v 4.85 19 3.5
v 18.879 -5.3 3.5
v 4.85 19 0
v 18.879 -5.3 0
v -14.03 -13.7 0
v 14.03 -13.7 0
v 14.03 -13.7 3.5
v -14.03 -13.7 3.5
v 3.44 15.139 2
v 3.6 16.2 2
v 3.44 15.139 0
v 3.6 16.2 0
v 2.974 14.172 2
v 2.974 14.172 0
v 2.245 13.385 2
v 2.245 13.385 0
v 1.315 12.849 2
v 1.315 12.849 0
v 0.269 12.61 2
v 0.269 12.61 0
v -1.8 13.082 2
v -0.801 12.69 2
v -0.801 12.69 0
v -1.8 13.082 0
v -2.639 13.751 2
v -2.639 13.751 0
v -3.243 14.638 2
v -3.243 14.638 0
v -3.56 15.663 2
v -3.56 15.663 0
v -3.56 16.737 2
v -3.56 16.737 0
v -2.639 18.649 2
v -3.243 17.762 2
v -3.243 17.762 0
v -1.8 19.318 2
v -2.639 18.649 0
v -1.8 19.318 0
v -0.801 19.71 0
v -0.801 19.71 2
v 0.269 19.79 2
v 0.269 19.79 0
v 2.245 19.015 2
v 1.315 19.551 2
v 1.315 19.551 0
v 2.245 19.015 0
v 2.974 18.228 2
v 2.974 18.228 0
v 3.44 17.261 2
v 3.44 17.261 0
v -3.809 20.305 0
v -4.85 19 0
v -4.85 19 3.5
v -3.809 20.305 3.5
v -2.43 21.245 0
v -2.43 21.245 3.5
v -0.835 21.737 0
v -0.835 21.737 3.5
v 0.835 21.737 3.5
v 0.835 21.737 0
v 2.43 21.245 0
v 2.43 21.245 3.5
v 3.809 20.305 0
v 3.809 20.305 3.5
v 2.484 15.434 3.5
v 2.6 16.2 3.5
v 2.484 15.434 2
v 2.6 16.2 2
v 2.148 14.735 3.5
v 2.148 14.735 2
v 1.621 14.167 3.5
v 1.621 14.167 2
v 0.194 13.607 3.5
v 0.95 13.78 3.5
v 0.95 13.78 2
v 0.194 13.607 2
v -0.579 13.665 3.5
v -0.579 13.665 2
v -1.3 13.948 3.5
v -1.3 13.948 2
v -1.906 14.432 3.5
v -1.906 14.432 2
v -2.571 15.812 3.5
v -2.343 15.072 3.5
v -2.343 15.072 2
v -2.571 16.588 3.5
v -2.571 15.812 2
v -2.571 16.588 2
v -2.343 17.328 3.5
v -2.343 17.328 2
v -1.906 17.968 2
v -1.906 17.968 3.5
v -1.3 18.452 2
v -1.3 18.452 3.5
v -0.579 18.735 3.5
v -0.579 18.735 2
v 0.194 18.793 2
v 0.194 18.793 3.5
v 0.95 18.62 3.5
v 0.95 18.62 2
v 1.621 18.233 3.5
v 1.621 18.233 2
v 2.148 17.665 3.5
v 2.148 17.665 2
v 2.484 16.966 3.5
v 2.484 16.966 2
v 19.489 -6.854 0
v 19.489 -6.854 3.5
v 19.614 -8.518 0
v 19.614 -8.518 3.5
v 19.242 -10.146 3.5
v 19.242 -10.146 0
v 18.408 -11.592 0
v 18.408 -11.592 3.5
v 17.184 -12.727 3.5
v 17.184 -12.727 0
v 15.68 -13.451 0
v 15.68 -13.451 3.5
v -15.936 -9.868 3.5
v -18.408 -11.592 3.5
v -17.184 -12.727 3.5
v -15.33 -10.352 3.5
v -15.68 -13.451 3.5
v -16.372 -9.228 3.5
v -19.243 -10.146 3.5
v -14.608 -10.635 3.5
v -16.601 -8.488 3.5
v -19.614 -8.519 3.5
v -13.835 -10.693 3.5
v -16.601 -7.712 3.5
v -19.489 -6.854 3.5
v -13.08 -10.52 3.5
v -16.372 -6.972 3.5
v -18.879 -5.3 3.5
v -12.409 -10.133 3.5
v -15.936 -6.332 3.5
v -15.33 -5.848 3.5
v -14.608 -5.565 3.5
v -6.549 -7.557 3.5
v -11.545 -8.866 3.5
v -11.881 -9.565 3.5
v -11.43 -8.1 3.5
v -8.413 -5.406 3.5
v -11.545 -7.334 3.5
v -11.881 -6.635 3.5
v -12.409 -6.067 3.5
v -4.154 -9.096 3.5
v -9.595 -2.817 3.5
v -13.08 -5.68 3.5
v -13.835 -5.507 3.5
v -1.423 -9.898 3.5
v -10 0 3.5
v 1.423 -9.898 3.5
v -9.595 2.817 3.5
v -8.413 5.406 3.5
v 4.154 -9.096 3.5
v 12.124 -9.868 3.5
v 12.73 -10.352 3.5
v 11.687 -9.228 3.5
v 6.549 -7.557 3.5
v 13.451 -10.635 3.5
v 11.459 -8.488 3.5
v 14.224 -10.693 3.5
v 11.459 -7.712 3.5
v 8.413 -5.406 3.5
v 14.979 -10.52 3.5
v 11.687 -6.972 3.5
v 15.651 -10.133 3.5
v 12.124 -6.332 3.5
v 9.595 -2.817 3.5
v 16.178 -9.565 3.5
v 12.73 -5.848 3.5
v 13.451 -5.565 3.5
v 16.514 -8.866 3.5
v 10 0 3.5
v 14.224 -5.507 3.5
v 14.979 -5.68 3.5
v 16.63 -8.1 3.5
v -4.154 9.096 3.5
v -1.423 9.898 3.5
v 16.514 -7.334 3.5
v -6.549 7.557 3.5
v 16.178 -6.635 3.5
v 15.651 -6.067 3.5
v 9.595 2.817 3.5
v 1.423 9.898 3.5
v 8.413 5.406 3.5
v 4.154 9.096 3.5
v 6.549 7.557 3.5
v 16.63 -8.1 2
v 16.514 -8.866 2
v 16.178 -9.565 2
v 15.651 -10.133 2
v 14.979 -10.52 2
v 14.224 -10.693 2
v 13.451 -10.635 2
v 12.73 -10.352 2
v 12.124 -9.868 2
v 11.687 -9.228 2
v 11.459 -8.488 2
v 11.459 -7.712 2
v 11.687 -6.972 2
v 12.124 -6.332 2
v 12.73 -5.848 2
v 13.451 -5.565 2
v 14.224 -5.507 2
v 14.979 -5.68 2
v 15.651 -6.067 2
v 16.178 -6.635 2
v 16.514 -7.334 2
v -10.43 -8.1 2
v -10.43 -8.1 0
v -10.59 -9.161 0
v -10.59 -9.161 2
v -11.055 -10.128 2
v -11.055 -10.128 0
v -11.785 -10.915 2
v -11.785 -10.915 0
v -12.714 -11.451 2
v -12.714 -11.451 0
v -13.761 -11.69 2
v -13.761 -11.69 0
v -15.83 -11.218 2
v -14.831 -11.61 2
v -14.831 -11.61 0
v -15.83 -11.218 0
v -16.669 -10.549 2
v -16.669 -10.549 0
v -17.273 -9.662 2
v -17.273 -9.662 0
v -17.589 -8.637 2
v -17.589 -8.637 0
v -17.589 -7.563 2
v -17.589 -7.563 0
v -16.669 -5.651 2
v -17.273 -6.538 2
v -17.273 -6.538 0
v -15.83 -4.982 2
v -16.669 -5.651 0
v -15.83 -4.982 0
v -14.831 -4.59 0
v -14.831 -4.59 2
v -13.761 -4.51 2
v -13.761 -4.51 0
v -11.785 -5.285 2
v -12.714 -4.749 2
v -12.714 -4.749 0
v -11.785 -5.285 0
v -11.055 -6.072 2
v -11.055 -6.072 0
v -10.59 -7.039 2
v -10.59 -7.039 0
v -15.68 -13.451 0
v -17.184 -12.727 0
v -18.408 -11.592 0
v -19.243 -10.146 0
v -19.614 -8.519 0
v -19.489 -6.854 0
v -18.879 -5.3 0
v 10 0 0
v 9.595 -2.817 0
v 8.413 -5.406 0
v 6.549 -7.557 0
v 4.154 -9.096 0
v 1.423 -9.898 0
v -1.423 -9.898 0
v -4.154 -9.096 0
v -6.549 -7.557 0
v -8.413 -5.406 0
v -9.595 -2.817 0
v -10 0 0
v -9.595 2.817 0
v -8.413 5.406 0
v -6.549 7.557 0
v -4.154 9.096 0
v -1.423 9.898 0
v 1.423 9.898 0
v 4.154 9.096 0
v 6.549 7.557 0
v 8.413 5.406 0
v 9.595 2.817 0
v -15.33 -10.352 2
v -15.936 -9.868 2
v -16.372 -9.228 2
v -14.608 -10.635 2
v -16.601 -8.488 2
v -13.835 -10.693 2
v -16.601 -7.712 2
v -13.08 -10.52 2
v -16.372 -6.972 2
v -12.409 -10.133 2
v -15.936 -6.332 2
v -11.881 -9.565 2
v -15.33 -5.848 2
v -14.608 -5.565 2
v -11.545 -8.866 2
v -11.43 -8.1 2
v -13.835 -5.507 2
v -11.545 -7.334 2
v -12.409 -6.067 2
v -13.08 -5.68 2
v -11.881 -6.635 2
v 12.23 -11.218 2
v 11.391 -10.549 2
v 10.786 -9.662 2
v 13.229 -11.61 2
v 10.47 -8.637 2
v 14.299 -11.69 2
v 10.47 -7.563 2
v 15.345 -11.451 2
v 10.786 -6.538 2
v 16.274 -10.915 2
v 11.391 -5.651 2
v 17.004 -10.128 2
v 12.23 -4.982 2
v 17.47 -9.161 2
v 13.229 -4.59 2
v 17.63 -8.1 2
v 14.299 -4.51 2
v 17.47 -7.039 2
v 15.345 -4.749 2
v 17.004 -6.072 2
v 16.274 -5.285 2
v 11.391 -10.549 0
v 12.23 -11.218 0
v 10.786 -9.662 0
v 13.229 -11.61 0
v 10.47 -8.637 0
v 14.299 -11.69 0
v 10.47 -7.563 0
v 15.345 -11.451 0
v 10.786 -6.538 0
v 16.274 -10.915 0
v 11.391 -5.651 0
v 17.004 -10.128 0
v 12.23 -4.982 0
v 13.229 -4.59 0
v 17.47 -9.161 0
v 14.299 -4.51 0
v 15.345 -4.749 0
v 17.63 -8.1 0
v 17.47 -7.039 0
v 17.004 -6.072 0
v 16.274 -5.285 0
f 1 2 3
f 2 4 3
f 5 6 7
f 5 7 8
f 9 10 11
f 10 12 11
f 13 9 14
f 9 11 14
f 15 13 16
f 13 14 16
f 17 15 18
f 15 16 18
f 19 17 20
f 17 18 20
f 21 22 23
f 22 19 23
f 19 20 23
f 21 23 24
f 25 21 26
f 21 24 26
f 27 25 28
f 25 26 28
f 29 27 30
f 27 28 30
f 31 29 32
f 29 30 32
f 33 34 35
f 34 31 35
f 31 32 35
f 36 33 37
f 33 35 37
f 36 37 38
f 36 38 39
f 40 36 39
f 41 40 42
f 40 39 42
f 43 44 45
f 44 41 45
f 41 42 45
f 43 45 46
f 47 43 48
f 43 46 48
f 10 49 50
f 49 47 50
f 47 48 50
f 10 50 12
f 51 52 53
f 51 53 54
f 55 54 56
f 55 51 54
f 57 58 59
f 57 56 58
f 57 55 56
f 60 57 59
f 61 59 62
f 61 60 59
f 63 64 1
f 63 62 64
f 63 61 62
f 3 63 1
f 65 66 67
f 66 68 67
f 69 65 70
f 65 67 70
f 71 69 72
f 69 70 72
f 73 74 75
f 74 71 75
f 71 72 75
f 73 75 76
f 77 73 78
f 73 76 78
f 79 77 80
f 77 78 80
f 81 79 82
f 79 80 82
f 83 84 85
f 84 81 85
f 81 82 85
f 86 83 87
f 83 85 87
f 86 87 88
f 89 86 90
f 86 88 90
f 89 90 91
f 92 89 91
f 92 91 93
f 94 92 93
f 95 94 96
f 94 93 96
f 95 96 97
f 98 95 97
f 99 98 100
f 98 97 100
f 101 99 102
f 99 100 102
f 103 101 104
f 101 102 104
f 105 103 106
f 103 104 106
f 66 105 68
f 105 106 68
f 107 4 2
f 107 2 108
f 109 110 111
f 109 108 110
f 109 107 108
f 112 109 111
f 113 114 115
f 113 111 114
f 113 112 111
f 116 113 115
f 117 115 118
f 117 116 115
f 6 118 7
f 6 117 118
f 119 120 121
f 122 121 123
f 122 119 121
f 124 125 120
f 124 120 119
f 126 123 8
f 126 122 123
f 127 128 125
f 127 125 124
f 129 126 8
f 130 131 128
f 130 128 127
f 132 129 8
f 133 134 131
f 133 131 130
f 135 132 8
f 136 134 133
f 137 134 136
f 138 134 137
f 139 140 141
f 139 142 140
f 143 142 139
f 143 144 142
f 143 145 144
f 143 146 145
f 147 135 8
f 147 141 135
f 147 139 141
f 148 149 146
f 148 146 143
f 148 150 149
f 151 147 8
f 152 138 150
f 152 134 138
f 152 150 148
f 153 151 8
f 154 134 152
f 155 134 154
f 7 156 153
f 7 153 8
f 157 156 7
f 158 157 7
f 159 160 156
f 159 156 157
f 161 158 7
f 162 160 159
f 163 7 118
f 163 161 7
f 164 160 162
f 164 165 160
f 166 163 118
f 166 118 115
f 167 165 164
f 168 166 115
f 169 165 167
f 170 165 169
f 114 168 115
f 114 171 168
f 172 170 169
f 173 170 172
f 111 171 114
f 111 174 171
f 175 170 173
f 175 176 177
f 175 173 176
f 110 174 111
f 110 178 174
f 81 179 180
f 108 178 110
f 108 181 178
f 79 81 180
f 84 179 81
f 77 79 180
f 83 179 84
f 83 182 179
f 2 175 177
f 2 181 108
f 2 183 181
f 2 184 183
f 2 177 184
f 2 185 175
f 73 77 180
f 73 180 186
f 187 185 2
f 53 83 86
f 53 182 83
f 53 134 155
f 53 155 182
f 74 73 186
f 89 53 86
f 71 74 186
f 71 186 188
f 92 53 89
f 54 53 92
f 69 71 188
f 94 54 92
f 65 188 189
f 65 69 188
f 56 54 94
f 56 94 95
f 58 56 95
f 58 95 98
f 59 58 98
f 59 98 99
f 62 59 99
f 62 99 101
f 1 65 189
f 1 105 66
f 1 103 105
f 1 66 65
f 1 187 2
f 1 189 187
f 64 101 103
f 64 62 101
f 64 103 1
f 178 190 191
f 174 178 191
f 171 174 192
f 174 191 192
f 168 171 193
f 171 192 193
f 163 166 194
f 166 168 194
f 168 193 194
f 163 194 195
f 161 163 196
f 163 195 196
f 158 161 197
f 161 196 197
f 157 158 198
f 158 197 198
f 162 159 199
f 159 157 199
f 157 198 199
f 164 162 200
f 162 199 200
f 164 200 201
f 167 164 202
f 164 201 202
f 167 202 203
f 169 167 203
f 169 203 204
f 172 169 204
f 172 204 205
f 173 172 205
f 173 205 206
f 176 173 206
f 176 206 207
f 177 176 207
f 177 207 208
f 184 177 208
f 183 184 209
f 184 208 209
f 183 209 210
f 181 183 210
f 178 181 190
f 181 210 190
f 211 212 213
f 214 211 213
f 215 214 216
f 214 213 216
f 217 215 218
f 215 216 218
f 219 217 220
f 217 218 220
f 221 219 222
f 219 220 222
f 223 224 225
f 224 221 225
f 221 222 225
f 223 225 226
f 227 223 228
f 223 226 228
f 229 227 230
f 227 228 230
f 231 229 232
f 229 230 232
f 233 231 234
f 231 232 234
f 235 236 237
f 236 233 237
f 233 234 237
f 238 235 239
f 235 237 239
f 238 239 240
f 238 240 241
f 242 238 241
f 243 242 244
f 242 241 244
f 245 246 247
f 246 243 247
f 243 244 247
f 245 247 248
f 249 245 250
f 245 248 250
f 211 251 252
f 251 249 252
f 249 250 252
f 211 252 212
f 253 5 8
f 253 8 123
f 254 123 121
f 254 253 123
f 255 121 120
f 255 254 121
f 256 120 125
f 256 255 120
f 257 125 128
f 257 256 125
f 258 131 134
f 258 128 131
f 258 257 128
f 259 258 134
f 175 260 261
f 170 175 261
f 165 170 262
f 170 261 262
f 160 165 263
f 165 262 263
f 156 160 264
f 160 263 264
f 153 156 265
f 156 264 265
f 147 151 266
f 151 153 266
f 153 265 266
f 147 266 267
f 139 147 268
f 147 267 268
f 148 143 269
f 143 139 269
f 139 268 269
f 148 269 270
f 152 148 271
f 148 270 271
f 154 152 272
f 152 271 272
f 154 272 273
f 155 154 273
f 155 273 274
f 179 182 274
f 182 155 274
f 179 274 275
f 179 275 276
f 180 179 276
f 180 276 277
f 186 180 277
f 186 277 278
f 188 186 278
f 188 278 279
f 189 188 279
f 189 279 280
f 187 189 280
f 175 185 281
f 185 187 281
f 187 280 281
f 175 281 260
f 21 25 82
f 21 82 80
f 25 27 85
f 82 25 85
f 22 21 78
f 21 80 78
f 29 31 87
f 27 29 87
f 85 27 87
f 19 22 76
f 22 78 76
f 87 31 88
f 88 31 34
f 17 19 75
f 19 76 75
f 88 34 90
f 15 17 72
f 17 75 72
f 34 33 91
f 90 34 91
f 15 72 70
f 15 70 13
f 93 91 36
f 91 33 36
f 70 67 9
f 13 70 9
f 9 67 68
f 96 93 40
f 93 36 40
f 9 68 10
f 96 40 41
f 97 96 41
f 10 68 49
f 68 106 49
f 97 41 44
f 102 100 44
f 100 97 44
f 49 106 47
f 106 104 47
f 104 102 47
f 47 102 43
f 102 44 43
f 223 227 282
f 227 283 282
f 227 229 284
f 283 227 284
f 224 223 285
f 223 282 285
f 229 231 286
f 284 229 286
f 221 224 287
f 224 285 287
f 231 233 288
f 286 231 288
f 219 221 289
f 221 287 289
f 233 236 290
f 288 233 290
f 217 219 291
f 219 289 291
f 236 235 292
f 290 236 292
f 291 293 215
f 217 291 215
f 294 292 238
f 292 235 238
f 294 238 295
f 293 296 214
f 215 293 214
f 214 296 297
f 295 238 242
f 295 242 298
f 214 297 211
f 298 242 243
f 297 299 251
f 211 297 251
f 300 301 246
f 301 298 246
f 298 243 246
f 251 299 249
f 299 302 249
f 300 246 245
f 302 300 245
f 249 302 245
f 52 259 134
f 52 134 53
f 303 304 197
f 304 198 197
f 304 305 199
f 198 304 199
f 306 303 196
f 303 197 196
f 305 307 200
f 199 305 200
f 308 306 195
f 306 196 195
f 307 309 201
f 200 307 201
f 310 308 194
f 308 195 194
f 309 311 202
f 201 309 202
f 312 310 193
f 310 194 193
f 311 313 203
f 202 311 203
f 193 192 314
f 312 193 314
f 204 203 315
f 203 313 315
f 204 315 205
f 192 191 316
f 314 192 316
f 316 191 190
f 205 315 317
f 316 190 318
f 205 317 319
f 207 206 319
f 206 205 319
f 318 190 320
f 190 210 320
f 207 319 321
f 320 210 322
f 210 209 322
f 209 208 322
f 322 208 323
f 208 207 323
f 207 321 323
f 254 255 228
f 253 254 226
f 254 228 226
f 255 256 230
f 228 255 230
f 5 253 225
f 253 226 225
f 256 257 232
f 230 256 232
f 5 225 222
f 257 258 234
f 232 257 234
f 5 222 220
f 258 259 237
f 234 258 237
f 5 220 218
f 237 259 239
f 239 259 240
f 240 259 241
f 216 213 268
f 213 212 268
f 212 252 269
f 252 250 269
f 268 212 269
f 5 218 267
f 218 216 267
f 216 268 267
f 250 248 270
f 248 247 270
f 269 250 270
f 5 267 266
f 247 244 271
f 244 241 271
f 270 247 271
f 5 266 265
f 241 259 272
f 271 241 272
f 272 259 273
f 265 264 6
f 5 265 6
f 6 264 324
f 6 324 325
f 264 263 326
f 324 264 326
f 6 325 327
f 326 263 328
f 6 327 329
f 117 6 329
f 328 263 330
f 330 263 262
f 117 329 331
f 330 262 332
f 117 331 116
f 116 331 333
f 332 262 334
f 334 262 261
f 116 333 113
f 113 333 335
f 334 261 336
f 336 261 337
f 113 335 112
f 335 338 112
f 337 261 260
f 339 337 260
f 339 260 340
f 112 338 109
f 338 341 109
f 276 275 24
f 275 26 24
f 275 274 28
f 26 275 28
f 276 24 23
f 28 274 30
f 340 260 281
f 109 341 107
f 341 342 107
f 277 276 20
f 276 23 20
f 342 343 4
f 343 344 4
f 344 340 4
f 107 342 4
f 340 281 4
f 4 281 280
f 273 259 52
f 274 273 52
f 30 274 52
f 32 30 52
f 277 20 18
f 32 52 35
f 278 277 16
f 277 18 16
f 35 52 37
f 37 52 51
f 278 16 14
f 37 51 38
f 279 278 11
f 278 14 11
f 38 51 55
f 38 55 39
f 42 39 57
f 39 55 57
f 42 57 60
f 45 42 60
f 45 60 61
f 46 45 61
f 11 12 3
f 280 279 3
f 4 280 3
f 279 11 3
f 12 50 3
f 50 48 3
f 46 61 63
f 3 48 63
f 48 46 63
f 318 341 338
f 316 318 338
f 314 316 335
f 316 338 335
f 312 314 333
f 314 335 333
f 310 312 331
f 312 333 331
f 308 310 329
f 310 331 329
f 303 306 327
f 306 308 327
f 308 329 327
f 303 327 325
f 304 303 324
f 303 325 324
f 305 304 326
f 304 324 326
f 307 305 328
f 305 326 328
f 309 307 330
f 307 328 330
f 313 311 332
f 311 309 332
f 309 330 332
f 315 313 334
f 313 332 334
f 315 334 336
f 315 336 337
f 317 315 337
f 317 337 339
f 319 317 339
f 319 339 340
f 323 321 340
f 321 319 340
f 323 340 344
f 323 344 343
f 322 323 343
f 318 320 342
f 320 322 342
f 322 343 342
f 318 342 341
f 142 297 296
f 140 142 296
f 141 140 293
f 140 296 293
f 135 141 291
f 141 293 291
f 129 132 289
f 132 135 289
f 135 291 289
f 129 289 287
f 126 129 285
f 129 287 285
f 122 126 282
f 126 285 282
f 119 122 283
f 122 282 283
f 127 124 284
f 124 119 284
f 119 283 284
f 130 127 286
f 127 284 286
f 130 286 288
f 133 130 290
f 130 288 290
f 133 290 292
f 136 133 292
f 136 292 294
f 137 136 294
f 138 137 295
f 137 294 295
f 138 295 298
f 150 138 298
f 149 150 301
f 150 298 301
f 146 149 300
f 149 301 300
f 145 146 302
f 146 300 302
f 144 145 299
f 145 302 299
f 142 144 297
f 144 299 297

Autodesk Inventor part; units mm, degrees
ref_plane "YZ Plane" through (0, 0, 0) normal (1, 0, 0) x (0, 1, 0)
ref_plane "XZ Plane" through (0, 0, 0) normal (0, 1, 0) x (-1, 0, 0)
ref_plane "XY Plane" through (0, 0, 0) normal (0, 0, 1) x (1, 0, 0)
sketch "Skizze1" plane through (0, 0, 0) normal (0, 0, 1) x (1, 0, 0)
  line L0 (-29.8259, 0) -> (29.8259, 0) construction
  circle A0 centre (0, 0) radius 16.2 construction
  circle A1 centre (0, 16.2) radius 3.6
  circle A2 centre (14.0296, -8.1) radius 3.6
  circle A3 centre (-14.0296, -8.1) radius 3.6
  line L1 (0, 0) -> (-14.0296, -8.1) construction
  line L2 (0, 0) -> (14.0296, -8.1) construction
  circle A4 centre (0, 16.2) radius 2.6
  circle A5 centre (-14.0296, -8.1) radius 2.6
  circle A6 centre (14.0296, -8.1) radius 2.6
  arc A7 (4.8497, 19) -> (-4.8497, 19) centre (0, 16.2) ccw
  arc A8 (-18.8794, -5.3) -> (-14.0296, -13.7) centre (-14.0296, -8.1) ccw
  line L3 (14.0296, -13.7) -> (-14.0296, -13.7)
  line L4 (-18.8794, -5.3) -> (-4.8497, 19)
  line L5 (18.8794, -5.3) -> (4.8497, 19)
  arc A9 (14.0296, -13.7) -> (18.8794, -5.3) centre (14.0296, -8.1) ccw
  line L6 (0, 29.4) -> (0, -23.8) construction
  line L7 (0, 0) -> (0, 16.2) construction
  circle A10 centre (0, 0) radius 10
  dimension "d0" = 7.2
  dimension "d1" = 32.4
  dimension "d2" = 120
  dimension "d8" = 1
  dimension "d12" = 2
  dimension "d13" = 120
  dimension "d14" = 20
extrude "Extrusion1" add sketch "Skizze1" along normal blind 2 contours L5 A9 L3 A8 L4 A7
extrude "Extrusion3" add sketch "Skizze1" along normal blind 1.5 from surface at 2 contours A1 | A2 | A3 | L5 A9 L3 A8 L4 A7
equation "\"d13\" = d2"
properties part number "Rotor"
